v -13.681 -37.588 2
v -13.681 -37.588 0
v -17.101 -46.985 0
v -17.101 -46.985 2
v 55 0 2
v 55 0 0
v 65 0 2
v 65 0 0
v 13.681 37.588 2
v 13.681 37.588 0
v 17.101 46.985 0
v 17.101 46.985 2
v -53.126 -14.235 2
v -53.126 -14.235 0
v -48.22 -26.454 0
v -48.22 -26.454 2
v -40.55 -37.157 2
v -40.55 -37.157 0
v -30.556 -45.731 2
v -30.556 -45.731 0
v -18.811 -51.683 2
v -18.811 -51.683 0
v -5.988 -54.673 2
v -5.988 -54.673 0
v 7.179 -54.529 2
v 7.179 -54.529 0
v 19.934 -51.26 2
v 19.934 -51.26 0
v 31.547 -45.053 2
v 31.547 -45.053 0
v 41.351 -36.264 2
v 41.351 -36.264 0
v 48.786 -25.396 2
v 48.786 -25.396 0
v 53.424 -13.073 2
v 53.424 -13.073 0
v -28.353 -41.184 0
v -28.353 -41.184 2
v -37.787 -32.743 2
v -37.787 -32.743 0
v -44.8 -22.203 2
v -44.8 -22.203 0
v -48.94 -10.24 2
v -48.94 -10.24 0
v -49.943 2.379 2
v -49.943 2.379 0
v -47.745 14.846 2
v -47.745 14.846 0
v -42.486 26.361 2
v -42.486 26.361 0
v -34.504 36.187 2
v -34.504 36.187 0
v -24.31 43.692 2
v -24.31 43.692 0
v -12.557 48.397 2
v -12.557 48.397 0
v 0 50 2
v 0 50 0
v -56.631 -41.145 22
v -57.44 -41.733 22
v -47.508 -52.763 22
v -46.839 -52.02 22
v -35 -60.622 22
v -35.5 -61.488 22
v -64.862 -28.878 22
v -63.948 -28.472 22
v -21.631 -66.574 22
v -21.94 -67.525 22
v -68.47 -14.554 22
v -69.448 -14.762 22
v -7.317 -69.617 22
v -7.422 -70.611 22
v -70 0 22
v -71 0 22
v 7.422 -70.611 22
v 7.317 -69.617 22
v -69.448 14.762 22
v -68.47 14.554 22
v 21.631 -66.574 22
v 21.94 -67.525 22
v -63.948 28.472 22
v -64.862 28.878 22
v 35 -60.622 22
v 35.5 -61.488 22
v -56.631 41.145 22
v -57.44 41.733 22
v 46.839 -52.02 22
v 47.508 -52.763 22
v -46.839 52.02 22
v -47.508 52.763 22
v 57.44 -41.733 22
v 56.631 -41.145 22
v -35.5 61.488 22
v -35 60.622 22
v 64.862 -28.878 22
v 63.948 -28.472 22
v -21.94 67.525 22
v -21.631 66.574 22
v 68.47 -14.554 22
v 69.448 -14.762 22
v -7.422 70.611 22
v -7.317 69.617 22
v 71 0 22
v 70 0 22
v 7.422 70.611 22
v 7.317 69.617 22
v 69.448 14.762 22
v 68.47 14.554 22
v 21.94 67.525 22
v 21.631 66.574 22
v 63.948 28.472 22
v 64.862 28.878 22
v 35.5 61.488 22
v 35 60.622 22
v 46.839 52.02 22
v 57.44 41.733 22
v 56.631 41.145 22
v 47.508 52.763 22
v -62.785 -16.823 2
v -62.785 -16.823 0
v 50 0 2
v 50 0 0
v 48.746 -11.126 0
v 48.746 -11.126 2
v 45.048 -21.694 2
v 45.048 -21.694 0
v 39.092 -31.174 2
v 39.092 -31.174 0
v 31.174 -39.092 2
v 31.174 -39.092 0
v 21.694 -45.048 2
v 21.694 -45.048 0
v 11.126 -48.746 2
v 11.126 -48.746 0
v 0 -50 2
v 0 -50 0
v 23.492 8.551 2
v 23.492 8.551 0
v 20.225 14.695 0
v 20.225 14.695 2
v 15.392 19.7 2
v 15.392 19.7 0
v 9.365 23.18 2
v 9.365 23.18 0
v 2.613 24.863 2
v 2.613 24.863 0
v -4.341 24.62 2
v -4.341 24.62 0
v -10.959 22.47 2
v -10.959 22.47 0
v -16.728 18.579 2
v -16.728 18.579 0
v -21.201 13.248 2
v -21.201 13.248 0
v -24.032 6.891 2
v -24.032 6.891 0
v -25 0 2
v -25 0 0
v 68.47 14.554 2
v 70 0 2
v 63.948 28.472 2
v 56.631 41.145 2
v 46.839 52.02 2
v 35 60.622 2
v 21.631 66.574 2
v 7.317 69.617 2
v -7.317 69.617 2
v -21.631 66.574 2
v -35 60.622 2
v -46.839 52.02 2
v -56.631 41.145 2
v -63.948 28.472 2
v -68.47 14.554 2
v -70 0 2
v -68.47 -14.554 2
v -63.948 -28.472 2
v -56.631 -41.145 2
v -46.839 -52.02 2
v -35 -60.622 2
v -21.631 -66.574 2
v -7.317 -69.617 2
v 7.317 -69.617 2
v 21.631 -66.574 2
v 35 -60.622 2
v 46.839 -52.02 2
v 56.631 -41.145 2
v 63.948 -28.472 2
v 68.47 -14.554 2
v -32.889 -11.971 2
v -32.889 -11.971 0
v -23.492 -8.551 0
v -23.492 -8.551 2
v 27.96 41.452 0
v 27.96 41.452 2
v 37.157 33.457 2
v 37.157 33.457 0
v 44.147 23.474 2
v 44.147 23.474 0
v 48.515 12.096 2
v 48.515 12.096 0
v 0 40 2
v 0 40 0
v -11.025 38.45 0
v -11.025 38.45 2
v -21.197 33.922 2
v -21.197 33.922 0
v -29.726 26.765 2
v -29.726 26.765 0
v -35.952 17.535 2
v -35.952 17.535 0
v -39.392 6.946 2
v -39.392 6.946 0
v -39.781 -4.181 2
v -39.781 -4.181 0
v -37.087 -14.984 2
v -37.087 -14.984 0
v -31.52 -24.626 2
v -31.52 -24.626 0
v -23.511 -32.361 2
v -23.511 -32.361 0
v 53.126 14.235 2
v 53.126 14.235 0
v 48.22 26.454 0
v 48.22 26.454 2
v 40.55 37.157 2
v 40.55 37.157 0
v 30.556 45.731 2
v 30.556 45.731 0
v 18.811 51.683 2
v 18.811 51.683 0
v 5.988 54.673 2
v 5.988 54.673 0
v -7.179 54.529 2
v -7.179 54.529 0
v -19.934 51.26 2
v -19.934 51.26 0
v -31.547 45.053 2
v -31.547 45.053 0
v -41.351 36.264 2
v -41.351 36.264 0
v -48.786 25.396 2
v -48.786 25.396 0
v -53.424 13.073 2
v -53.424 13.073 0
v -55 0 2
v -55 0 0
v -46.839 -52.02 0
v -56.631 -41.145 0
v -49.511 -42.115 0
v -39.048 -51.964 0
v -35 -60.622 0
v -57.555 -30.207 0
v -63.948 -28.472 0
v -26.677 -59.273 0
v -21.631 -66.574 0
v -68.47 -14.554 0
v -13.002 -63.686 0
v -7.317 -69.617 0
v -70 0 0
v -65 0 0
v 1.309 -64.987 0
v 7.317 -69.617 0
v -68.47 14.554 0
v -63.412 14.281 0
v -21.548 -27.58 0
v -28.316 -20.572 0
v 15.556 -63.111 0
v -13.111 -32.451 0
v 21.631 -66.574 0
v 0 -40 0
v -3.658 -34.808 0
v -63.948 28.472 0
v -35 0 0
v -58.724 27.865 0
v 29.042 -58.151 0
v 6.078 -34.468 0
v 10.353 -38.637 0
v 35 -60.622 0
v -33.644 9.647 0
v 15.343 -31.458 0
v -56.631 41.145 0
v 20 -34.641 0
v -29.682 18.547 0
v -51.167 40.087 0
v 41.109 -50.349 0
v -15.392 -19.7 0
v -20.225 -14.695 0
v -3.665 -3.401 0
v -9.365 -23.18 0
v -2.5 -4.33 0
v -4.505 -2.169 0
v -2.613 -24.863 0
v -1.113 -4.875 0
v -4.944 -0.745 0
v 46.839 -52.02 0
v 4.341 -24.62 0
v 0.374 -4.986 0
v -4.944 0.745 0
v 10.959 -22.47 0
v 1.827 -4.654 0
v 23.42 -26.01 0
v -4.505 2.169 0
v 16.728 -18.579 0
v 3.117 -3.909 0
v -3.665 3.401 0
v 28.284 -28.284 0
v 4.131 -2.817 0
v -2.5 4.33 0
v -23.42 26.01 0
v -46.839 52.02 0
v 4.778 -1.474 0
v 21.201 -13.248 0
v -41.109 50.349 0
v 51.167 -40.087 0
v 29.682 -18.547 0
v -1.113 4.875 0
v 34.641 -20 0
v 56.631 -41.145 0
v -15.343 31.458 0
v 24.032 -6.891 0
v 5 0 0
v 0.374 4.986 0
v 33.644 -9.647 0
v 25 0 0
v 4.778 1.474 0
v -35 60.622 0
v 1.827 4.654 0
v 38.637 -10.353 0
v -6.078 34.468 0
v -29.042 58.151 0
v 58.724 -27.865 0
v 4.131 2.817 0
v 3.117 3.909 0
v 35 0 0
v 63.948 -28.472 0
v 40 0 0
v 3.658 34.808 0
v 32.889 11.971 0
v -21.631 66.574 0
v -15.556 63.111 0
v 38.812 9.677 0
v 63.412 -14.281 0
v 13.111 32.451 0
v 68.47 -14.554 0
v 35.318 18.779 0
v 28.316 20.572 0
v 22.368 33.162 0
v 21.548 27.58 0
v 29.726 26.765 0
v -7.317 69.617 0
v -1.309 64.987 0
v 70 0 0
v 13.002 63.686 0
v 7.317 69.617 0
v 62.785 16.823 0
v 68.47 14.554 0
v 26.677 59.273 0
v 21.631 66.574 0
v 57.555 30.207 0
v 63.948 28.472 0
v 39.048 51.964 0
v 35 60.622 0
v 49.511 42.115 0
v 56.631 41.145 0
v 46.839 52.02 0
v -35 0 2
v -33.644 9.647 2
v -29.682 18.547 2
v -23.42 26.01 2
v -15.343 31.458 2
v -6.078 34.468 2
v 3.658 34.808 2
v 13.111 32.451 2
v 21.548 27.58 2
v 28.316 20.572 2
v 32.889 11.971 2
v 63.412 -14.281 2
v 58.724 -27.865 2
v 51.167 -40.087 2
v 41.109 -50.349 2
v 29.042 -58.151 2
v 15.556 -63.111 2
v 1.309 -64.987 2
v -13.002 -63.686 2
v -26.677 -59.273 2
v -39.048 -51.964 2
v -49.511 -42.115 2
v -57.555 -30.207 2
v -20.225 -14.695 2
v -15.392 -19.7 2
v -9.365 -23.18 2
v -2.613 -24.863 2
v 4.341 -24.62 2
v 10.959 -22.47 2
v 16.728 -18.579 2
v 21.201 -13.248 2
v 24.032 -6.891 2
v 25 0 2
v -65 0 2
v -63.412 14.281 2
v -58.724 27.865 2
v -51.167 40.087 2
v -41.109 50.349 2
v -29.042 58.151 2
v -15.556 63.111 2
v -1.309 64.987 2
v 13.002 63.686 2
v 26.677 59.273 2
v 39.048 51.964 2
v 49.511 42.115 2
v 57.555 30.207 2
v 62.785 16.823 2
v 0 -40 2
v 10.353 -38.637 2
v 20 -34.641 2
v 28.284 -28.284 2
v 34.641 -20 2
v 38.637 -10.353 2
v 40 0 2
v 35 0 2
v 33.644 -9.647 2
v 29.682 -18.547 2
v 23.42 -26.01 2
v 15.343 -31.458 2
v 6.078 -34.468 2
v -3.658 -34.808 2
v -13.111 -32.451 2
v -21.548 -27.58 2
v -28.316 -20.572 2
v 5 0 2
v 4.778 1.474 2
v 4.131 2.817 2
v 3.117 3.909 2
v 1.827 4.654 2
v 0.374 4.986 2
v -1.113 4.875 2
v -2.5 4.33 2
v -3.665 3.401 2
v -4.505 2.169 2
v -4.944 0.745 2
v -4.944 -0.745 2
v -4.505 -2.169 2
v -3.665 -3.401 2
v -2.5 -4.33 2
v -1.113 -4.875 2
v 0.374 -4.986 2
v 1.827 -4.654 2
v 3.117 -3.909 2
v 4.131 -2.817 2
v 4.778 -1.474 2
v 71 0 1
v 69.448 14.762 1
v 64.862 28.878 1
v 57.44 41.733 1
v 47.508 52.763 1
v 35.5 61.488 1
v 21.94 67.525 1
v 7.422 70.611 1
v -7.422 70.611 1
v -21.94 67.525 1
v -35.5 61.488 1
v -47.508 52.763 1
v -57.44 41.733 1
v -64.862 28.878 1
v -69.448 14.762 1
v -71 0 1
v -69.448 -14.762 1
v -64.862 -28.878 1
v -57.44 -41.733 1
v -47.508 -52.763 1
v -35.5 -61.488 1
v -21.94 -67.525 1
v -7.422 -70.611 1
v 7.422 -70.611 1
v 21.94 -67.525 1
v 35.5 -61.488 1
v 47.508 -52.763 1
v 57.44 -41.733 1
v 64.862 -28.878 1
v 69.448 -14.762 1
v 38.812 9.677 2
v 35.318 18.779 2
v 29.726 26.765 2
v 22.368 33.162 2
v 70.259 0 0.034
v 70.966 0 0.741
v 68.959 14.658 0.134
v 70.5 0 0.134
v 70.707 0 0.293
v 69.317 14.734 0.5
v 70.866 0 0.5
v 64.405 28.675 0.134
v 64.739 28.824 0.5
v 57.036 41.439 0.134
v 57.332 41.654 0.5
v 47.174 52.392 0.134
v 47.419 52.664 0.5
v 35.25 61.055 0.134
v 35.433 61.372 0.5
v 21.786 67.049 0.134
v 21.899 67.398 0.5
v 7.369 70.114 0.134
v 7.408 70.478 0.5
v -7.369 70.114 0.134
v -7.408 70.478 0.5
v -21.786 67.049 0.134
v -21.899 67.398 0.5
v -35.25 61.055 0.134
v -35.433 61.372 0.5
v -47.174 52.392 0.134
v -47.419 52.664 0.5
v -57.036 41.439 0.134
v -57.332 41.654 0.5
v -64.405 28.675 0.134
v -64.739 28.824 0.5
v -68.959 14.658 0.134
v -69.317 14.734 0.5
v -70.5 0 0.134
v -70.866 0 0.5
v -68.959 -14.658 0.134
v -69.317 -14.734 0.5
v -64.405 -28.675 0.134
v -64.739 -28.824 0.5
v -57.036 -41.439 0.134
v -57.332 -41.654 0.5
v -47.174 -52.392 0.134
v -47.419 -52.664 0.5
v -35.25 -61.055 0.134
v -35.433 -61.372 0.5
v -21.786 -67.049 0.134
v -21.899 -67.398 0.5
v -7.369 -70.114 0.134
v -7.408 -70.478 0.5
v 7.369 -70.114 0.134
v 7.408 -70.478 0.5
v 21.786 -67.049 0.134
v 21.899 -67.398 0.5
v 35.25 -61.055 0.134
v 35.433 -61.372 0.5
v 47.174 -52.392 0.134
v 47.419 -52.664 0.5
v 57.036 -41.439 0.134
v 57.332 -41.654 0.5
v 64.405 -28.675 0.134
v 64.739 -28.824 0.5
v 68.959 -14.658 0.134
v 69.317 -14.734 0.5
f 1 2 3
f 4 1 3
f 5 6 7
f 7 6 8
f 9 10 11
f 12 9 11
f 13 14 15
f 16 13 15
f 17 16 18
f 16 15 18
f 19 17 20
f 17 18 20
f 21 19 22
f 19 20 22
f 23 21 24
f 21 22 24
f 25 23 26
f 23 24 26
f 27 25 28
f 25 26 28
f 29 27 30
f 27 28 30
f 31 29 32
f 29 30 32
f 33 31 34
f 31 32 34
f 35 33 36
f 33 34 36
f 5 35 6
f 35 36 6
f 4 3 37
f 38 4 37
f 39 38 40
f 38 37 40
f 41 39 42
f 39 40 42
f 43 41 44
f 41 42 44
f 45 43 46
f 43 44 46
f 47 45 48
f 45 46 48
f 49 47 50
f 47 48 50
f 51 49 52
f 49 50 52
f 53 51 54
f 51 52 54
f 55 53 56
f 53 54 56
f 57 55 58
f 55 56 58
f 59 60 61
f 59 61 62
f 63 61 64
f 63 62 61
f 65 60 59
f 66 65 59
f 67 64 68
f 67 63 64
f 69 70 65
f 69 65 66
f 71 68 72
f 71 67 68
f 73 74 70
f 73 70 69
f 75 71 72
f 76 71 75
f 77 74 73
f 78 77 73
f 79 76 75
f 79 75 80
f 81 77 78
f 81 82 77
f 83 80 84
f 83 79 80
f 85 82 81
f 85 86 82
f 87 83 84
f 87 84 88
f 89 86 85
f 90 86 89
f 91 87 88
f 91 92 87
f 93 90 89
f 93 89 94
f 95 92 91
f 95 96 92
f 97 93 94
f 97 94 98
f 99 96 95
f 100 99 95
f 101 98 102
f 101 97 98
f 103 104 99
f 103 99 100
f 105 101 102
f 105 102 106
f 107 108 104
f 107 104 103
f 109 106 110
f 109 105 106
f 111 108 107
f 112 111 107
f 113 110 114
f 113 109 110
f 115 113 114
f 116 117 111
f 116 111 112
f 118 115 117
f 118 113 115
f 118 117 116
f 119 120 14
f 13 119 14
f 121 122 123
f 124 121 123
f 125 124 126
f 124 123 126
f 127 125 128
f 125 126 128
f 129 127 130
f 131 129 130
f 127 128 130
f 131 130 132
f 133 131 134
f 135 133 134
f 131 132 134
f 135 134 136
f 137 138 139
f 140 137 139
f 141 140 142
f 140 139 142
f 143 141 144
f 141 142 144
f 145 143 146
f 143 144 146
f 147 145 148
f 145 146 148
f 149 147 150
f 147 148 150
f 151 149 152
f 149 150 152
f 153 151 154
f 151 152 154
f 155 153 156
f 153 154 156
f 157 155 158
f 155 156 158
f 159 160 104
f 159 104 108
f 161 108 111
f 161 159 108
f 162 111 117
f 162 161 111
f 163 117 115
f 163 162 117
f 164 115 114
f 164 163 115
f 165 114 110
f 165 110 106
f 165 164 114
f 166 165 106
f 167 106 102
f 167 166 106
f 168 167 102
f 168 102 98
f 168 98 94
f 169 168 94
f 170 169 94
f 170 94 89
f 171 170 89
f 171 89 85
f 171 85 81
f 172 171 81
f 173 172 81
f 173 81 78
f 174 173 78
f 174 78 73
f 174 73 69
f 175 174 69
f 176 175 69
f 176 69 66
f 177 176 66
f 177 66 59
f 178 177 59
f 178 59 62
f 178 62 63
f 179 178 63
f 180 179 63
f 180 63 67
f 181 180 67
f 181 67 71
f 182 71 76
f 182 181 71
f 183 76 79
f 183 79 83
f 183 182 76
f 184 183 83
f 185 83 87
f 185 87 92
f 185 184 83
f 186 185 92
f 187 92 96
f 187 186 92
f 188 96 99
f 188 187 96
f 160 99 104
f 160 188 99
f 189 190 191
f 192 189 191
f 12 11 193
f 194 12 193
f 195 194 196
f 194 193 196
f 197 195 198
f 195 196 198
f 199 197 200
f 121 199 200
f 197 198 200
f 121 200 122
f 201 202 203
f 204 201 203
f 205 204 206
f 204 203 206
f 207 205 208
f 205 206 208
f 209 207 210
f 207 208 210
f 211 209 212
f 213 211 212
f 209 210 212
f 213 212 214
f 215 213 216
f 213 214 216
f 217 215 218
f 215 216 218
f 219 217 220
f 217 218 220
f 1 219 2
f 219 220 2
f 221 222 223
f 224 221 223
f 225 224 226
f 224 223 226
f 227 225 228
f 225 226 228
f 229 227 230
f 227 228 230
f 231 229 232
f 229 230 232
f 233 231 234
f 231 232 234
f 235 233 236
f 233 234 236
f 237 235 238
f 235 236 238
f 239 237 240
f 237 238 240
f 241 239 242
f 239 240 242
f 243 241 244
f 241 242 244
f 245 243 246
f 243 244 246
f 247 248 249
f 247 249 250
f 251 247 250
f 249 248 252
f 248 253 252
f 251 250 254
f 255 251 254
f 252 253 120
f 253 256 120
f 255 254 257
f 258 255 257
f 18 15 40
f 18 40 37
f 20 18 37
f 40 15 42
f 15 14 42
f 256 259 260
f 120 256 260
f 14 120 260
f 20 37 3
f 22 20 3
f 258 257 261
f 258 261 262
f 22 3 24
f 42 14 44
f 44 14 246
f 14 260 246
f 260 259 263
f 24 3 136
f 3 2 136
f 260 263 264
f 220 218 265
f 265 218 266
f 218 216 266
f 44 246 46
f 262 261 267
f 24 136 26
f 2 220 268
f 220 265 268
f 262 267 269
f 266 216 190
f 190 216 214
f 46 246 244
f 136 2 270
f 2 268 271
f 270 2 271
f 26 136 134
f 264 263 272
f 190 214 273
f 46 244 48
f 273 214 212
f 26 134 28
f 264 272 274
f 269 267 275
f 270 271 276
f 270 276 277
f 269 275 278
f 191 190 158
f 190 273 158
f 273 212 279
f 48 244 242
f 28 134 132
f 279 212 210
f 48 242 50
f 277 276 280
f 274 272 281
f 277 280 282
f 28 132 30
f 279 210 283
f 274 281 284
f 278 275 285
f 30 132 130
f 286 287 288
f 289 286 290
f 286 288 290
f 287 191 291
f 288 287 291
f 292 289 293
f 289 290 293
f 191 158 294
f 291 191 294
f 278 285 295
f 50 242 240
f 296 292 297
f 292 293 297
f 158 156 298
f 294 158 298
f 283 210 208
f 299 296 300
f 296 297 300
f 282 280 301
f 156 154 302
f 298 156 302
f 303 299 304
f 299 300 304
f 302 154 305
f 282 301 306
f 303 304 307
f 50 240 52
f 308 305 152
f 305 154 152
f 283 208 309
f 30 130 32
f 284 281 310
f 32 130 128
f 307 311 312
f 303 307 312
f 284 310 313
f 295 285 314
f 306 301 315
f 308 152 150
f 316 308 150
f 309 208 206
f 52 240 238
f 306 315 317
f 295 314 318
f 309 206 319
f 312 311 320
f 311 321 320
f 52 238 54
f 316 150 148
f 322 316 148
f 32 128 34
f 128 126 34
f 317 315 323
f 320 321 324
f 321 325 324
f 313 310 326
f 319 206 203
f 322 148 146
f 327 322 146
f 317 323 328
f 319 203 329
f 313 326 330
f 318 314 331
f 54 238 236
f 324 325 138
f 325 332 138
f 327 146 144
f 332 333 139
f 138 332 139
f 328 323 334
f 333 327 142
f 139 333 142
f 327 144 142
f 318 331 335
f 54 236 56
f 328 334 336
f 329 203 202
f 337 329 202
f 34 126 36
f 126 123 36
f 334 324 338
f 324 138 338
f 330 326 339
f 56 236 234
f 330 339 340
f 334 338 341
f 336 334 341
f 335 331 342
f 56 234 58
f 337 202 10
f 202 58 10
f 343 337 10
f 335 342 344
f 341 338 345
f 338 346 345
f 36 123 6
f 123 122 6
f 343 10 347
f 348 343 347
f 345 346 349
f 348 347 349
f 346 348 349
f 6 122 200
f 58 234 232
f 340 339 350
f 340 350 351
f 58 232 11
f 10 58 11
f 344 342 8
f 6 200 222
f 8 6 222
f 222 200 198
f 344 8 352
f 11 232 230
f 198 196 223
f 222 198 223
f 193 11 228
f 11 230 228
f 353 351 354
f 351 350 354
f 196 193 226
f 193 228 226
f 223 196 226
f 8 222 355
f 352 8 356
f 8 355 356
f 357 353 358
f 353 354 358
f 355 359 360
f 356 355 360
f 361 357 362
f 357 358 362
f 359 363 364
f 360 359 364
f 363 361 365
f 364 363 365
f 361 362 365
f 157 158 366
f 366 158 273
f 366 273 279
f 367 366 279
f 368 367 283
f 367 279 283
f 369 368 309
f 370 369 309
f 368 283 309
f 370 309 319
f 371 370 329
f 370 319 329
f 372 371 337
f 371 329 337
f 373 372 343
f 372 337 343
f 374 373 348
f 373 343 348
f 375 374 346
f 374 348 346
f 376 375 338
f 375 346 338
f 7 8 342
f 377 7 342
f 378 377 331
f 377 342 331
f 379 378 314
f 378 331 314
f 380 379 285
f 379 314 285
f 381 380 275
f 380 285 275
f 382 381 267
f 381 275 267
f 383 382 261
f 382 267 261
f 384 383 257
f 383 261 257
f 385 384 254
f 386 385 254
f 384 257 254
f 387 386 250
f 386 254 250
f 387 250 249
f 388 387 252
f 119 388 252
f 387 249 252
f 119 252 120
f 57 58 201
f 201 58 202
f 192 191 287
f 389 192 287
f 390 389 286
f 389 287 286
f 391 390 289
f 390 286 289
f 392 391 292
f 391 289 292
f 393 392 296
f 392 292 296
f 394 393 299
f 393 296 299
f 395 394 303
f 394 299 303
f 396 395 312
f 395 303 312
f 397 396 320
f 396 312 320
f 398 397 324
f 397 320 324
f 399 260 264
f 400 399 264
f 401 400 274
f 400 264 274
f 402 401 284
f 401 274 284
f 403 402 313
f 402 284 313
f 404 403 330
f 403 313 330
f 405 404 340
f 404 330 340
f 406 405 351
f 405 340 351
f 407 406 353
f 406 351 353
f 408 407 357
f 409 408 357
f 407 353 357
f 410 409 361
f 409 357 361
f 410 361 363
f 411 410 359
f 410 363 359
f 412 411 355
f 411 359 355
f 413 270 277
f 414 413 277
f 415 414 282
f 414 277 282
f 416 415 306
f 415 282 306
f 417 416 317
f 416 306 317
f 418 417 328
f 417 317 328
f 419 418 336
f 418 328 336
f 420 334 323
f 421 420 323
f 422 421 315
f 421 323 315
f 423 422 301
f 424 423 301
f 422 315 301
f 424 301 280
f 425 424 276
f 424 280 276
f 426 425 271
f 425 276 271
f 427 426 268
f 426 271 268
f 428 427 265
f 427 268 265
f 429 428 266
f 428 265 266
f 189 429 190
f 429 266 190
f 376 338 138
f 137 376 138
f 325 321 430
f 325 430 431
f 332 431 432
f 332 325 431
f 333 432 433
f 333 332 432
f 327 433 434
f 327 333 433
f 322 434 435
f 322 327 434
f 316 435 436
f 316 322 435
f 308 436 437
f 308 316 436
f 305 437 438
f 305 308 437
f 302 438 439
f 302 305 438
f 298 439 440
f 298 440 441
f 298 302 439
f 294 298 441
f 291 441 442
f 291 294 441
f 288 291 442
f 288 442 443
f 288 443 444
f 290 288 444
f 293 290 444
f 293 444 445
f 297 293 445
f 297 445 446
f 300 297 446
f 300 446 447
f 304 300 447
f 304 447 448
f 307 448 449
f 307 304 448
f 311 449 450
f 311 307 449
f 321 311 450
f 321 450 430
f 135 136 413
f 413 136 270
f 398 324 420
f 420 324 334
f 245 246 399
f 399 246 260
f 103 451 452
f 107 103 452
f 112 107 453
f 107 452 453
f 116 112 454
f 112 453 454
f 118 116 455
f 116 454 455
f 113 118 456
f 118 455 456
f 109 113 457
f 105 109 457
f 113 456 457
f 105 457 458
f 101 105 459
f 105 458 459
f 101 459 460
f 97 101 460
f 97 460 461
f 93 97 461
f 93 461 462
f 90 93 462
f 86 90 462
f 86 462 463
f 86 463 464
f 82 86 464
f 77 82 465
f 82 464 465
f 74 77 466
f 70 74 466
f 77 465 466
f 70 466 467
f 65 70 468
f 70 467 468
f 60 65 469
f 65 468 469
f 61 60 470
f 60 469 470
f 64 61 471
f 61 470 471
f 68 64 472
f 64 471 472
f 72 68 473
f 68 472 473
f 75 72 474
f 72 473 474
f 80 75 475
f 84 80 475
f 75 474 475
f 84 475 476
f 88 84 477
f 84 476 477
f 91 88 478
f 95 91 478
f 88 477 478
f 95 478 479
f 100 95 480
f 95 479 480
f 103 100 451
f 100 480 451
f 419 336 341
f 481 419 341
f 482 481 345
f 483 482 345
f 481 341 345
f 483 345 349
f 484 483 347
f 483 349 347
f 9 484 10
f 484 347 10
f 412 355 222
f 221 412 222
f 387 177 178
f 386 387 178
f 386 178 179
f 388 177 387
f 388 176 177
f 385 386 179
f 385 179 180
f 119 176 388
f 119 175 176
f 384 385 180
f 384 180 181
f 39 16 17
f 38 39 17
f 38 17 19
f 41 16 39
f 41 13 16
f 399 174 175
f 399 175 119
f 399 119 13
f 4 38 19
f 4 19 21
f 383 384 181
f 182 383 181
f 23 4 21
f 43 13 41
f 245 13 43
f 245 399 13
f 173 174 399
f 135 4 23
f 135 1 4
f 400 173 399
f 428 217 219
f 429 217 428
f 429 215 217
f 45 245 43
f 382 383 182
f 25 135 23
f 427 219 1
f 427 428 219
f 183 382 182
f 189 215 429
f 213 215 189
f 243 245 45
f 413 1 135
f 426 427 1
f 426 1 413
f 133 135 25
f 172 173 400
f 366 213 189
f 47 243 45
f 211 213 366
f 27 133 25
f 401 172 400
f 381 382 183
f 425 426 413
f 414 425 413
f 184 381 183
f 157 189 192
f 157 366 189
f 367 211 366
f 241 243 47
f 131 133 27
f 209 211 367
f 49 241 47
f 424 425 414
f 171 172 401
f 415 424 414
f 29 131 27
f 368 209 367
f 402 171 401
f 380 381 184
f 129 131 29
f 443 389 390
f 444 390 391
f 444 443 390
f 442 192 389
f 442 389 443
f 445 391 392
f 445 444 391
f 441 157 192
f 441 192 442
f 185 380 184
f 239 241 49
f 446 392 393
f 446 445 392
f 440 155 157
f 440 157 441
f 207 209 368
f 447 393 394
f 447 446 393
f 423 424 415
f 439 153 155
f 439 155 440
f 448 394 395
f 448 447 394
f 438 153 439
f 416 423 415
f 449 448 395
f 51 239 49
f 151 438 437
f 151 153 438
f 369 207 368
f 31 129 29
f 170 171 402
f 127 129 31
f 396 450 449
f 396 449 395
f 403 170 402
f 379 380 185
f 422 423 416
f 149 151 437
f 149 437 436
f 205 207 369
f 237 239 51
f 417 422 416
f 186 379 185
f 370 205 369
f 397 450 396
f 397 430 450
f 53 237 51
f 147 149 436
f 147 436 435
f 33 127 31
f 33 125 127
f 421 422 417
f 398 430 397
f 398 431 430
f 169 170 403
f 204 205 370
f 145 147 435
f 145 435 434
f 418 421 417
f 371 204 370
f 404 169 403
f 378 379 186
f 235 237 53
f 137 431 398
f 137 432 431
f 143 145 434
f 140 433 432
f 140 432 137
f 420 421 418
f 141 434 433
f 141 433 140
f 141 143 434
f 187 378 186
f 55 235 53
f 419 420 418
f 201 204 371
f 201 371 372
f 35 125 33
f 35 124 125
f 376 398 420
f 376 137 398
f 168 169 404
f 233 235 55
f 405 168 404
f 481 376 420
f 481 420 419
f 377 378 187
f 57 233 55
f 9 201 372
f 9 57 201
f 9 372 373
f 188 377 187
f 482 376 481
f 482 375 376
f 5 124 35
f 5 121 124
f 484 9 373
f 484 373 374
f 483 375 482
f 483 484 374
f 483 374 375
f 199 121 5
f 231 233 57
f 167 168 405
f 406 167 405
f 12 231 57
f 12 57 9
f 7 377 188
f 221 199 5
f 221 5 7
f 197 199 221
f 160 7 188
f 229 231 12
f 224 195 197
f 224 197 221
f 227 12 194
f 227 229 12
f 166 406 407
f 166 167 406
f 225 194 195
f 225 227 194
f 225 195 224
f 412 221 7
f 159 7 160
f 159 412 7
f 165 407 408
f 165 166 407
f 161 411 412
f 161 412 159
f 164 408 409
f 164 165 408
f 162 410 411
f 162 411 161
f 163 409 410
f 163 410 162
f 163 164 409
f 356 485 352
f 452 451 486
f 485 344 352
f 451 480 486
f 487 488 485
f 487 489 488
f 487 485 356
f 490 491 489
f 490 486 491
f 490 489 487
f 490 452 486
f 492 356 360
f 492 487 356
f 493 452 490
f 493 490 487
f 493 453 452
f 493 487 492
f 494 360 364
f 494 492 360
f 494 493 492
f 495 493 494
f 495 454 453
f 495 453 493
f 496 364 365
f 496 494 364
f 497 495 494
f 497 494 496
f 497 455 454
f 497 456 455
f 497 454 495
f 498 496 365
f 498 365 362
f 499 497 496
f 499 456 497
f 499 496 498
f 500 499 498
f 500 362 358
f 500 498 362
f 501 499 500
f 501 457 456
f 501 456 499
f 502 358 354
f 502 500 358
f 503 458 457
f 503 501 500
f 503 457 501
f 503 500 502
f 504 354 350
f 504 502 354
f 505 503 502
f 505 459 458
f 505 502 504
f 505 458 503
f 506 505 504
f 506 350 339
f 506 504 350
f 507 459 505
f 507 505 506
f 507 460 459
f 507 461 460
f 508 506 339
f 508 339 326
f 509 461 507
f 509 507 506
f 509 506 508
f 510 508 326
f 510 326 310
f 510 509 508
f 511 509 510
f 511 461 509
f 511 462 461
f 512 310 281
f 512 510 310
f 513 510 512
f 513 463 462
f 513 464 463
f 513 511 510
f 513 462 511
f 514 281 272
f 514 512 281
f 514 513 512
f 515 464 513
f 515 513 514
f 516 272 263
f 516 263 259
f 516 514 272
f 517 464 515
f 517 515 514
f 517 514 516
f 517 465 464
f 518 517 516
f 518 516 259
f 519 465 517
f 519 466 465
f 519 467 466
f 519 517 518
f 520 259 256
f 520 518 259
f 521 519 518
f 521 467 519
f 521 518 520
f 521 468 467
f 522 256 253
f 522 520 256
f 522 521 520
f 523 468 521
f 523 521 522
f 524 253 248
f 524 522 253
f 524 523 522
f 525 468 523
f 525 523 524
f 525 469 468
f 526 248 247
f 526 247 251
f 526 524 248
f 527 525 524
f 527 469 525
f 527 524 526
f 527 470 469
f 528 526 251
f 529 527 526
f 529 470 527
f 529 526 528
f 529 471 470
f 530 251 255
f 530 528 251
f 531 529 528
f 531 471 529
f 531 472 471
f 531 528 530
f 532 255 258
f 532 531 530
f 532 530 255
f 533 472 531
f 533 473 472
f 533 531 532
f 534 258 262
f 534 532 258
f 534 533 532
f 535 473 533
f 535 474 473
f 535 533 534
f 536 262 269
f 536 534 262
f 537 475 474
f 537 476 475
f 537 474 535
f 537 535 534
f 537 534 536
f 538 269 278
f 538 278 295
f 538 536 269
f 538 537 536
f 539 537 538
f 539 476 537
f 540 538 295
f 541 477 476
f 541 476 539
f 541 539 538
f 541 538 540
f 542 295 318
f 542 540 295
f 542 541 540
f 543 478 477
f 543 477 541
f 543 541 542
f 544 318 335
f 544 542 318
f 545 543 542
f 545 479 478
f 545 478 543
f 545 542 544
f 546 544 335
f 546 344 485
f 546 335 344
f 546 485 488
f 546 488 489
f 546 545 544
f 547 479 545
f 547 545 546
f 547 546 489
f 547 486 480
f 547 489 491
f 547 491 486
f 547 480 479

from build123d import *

# Parameters (mm, degrees)
F2_R     = 71
F2_R_2   = 70
F3_DEPTH = 22
F2_R_3   = 5
F4_DEPTH = 2
F5_R     = 1


with BuildPart() as f3:
    # F2 (on Top) → F3 (new body)
    with BuildSketch(Plane.XY):
        Circle(F2_R)
        Circle(F2_R_2, mode=Mode.SUBTRACT)
    extrude(amount=F3_DEPTH)

    # F2 (on Top) → F4 (join)
    with BuildSketch(Plane.XY):
        Circle(F2_R_2)
        with BuildLine():
            ThreePointArc((62.7851787088, 16.8232379317), (64.4439159893, 8.4842024943), (65, 0))
            ThreePointArc((65, 0), (8.4842024943, -64.4439159893), (-62.7851787088, -16.8232379317))
            ThreePointArc((-62.7851787088, -16.8232379317), (-64.4439159893, -8.4842024943), (-65, 0))
            ThreePointArc((-65, 0), (-8.4842024943, 64.4439159893), (62.7851787088, 16.8232379317))
        make_face(mode=Mode.SUBTRACT)
        with BuildLine():
            ThreePointArc((-53.1259204459, -14.2350474806), (7.1789405721, -54.5294673756), (55, 0))
            ThreePointArc((55, 0), (54.5294673756, 7.1789405721), (53.1259204459, 14.2350474806))
            ThreePointArc((53.1259204459, 14.2350474806), (-7.1789405721, 54.5294673756), (-55, 0))
            ThreePointArc((-55, 0), (-54.5294673756, -7.1789405721), (-53.1259204459, -14.2350474806))
        make_face()
        with BuildLine():
            ThreePointArc((17.1010071663, 46.9846310393), (40.9576022144, 28.6788218176), (50, 0))
            ThreePointArc((50, 0), (35.3553390593, -35.3553390593), (0, -50))
            ThreePointArc((0, -50), (-8.6824088833, -49.2403876506), (-17.1010071663, -46.9846310393))
            ThreePointArc((-17.1010071663, -46.9846310393), (-49.2403876506, 8.6824088833), (0, 50))
            ThreePointArc((0, 50), (8.6824088833, 49.2403876506), (17.1010071663, 46.9846310393))
        make_face(mode=Mode.SUBTRACT)
        with BuildLine():
            ThreePointArc((40, 0), (32.7660817716, 22.943057454), (13.680805733, 37.5877048314))
            ThreePointArc((13.680805733, 37.5877048314), (6.9459271067, 39.3923101205), (0, 40))
            ThreePointArc((0, 40), (-39.3923101205, 6.9459271067), (-13.680805733, -37.5877048314))
            ThreePointArc((-13.680805733, -37.5877048314), (-6.9459271067, -39.3923101205), (0, -40))
            ThreePointArc((0, -40), (28.2842712475, -28.2842712475), (40, 0))
        make_face()
        with BuildLine():
            ThreePointArc((32.8892417275, 11.9707050164), (34.4682713554, 6.0776862183), (35, 0))
            ThreePointArc((35, 0), (6.0776862183, -34.4682713554), (-32.8892417275, -11.9707050164))
            ThreePointArc((-32.8892417275, -11.9707050164), (-34.4682713554, -6.0776862183), (-35, 0))
            ThreePointArc((-35, 0), (-6.0776862183, 34.4682713554), (32.8892417275, 11.9707050164))
        make_face(mode=Mode.SUBTRACT)
        with BuildLine():
            ThreePointArc((-23.4923155196, -8.5505035831), (4.3412044417, -24.6201938253), (25, 0))
            ThreePointArc((25, 0), (24.6201938253, 4.3412044417), (23.4923155196, 8.5505035831))
            ThreePointArc((23.4923155196, 8.5505035831), (-4.3412044417, 24.6201938253), (-25, 0))
            ThreePointArc((-25, 0), (-24.6201938253, -4.3412044417), (-23.4923155196, -8.5505035831))
        make_face()
        Circle(F2_R_3, mode=Mode.SUBTRACT)
        with BuildLine():
            ThreePointArc((-17.1010071663, -46.9846310393), (-8.6824088833, -49.2403876506), (0, -50))
            Line((0, -50), (0, -40))
            ThreePointArc((0, -40), (-6.9459271067, -39.3923101205), (-13.680805733, -37.5877048314))
            Line((-13.680805733, -37.5877048314), (-17.1010071663, -46.9846310393))
        make_face()
        with BuildLine():
            Line((13.680805733, 37.5877048314), (17.1010071663, 46.9846310393))
            ThreePointArc((17.1010071663, 46.9846310393), (8.6824088833, 49.2403876506), (0, 50))
            Line((0, 50), (0, 40))
            ThreePointArc((0, 40), (6.9459271067, 39.3923101205), (13.680805733, 37.5877048314))
        make_face()
        with BuildLine():
            ThreePointArc((-65, 0), (-64.4439159893, -8.4842024943), (-62.7851787088, -16.8232379317))
            Line((-62.7851787088, -16.8232379317), (-53.1259204459, -14.2350474806))
            ThreePointArc((-53.1259204459, -14.2350474806), (-54.5294673756, -7.1789405721), (-55, 0))
            Line((-55, 0), (-65, 0))
        make_face()
        with BuildLine():
            Line((55, 0), (65, 0))
            ThreePointArc((65, 0), (64.4439159893, 8.4842024943), (62.7851787088, 16.8232379317))
            Line((62.7851787088, 16.8232379317), (53.1259204459, 14.2350474806))
            ThreePointArc((53.1259204459, 14.2350474806), (54.5294673756, 7.1789405721), (55, 0))
        make_face()
        with BuildLine():
            ThreePointArc((-35, 0), (-34.4682713554, -6.0776862183), (-32.8892417275, -11.9707050164))
            Line((-32.8892417275, -11.9707050164), (-23.4923155196, -8.5505035831))
            ThreePointArc((-23.4923155196, -8.5505035831), (-24.6201938253, -4.3412044417), (-25, 0))
            Line((-25, 0), (-35, 0))
        make_face()
        with BuildLine():
            Line((25, 0), (35, 0))
            ThreePointArc((35, 0), (34.4682713554, 6.0776862183), (32.8892417275, 11.9707050164))
            Line((32.8892417275, 11.9707050164), (23.4923155196, 8.5505035831))
            ThreePointArc((23.4923155196, 8.5505035831), (24.6201938253, 4.3412044417), (25, 0))
        make_face()
    extrude(amount=F4_DEPTH)

    # F5
    f5_edges = [f3.edges().sort_by_distance(p)[0] for p in [
        (-71, 0, 0),
    ]]
    fillet(f5_edges, radius=F5_R)


solid = f3.part
